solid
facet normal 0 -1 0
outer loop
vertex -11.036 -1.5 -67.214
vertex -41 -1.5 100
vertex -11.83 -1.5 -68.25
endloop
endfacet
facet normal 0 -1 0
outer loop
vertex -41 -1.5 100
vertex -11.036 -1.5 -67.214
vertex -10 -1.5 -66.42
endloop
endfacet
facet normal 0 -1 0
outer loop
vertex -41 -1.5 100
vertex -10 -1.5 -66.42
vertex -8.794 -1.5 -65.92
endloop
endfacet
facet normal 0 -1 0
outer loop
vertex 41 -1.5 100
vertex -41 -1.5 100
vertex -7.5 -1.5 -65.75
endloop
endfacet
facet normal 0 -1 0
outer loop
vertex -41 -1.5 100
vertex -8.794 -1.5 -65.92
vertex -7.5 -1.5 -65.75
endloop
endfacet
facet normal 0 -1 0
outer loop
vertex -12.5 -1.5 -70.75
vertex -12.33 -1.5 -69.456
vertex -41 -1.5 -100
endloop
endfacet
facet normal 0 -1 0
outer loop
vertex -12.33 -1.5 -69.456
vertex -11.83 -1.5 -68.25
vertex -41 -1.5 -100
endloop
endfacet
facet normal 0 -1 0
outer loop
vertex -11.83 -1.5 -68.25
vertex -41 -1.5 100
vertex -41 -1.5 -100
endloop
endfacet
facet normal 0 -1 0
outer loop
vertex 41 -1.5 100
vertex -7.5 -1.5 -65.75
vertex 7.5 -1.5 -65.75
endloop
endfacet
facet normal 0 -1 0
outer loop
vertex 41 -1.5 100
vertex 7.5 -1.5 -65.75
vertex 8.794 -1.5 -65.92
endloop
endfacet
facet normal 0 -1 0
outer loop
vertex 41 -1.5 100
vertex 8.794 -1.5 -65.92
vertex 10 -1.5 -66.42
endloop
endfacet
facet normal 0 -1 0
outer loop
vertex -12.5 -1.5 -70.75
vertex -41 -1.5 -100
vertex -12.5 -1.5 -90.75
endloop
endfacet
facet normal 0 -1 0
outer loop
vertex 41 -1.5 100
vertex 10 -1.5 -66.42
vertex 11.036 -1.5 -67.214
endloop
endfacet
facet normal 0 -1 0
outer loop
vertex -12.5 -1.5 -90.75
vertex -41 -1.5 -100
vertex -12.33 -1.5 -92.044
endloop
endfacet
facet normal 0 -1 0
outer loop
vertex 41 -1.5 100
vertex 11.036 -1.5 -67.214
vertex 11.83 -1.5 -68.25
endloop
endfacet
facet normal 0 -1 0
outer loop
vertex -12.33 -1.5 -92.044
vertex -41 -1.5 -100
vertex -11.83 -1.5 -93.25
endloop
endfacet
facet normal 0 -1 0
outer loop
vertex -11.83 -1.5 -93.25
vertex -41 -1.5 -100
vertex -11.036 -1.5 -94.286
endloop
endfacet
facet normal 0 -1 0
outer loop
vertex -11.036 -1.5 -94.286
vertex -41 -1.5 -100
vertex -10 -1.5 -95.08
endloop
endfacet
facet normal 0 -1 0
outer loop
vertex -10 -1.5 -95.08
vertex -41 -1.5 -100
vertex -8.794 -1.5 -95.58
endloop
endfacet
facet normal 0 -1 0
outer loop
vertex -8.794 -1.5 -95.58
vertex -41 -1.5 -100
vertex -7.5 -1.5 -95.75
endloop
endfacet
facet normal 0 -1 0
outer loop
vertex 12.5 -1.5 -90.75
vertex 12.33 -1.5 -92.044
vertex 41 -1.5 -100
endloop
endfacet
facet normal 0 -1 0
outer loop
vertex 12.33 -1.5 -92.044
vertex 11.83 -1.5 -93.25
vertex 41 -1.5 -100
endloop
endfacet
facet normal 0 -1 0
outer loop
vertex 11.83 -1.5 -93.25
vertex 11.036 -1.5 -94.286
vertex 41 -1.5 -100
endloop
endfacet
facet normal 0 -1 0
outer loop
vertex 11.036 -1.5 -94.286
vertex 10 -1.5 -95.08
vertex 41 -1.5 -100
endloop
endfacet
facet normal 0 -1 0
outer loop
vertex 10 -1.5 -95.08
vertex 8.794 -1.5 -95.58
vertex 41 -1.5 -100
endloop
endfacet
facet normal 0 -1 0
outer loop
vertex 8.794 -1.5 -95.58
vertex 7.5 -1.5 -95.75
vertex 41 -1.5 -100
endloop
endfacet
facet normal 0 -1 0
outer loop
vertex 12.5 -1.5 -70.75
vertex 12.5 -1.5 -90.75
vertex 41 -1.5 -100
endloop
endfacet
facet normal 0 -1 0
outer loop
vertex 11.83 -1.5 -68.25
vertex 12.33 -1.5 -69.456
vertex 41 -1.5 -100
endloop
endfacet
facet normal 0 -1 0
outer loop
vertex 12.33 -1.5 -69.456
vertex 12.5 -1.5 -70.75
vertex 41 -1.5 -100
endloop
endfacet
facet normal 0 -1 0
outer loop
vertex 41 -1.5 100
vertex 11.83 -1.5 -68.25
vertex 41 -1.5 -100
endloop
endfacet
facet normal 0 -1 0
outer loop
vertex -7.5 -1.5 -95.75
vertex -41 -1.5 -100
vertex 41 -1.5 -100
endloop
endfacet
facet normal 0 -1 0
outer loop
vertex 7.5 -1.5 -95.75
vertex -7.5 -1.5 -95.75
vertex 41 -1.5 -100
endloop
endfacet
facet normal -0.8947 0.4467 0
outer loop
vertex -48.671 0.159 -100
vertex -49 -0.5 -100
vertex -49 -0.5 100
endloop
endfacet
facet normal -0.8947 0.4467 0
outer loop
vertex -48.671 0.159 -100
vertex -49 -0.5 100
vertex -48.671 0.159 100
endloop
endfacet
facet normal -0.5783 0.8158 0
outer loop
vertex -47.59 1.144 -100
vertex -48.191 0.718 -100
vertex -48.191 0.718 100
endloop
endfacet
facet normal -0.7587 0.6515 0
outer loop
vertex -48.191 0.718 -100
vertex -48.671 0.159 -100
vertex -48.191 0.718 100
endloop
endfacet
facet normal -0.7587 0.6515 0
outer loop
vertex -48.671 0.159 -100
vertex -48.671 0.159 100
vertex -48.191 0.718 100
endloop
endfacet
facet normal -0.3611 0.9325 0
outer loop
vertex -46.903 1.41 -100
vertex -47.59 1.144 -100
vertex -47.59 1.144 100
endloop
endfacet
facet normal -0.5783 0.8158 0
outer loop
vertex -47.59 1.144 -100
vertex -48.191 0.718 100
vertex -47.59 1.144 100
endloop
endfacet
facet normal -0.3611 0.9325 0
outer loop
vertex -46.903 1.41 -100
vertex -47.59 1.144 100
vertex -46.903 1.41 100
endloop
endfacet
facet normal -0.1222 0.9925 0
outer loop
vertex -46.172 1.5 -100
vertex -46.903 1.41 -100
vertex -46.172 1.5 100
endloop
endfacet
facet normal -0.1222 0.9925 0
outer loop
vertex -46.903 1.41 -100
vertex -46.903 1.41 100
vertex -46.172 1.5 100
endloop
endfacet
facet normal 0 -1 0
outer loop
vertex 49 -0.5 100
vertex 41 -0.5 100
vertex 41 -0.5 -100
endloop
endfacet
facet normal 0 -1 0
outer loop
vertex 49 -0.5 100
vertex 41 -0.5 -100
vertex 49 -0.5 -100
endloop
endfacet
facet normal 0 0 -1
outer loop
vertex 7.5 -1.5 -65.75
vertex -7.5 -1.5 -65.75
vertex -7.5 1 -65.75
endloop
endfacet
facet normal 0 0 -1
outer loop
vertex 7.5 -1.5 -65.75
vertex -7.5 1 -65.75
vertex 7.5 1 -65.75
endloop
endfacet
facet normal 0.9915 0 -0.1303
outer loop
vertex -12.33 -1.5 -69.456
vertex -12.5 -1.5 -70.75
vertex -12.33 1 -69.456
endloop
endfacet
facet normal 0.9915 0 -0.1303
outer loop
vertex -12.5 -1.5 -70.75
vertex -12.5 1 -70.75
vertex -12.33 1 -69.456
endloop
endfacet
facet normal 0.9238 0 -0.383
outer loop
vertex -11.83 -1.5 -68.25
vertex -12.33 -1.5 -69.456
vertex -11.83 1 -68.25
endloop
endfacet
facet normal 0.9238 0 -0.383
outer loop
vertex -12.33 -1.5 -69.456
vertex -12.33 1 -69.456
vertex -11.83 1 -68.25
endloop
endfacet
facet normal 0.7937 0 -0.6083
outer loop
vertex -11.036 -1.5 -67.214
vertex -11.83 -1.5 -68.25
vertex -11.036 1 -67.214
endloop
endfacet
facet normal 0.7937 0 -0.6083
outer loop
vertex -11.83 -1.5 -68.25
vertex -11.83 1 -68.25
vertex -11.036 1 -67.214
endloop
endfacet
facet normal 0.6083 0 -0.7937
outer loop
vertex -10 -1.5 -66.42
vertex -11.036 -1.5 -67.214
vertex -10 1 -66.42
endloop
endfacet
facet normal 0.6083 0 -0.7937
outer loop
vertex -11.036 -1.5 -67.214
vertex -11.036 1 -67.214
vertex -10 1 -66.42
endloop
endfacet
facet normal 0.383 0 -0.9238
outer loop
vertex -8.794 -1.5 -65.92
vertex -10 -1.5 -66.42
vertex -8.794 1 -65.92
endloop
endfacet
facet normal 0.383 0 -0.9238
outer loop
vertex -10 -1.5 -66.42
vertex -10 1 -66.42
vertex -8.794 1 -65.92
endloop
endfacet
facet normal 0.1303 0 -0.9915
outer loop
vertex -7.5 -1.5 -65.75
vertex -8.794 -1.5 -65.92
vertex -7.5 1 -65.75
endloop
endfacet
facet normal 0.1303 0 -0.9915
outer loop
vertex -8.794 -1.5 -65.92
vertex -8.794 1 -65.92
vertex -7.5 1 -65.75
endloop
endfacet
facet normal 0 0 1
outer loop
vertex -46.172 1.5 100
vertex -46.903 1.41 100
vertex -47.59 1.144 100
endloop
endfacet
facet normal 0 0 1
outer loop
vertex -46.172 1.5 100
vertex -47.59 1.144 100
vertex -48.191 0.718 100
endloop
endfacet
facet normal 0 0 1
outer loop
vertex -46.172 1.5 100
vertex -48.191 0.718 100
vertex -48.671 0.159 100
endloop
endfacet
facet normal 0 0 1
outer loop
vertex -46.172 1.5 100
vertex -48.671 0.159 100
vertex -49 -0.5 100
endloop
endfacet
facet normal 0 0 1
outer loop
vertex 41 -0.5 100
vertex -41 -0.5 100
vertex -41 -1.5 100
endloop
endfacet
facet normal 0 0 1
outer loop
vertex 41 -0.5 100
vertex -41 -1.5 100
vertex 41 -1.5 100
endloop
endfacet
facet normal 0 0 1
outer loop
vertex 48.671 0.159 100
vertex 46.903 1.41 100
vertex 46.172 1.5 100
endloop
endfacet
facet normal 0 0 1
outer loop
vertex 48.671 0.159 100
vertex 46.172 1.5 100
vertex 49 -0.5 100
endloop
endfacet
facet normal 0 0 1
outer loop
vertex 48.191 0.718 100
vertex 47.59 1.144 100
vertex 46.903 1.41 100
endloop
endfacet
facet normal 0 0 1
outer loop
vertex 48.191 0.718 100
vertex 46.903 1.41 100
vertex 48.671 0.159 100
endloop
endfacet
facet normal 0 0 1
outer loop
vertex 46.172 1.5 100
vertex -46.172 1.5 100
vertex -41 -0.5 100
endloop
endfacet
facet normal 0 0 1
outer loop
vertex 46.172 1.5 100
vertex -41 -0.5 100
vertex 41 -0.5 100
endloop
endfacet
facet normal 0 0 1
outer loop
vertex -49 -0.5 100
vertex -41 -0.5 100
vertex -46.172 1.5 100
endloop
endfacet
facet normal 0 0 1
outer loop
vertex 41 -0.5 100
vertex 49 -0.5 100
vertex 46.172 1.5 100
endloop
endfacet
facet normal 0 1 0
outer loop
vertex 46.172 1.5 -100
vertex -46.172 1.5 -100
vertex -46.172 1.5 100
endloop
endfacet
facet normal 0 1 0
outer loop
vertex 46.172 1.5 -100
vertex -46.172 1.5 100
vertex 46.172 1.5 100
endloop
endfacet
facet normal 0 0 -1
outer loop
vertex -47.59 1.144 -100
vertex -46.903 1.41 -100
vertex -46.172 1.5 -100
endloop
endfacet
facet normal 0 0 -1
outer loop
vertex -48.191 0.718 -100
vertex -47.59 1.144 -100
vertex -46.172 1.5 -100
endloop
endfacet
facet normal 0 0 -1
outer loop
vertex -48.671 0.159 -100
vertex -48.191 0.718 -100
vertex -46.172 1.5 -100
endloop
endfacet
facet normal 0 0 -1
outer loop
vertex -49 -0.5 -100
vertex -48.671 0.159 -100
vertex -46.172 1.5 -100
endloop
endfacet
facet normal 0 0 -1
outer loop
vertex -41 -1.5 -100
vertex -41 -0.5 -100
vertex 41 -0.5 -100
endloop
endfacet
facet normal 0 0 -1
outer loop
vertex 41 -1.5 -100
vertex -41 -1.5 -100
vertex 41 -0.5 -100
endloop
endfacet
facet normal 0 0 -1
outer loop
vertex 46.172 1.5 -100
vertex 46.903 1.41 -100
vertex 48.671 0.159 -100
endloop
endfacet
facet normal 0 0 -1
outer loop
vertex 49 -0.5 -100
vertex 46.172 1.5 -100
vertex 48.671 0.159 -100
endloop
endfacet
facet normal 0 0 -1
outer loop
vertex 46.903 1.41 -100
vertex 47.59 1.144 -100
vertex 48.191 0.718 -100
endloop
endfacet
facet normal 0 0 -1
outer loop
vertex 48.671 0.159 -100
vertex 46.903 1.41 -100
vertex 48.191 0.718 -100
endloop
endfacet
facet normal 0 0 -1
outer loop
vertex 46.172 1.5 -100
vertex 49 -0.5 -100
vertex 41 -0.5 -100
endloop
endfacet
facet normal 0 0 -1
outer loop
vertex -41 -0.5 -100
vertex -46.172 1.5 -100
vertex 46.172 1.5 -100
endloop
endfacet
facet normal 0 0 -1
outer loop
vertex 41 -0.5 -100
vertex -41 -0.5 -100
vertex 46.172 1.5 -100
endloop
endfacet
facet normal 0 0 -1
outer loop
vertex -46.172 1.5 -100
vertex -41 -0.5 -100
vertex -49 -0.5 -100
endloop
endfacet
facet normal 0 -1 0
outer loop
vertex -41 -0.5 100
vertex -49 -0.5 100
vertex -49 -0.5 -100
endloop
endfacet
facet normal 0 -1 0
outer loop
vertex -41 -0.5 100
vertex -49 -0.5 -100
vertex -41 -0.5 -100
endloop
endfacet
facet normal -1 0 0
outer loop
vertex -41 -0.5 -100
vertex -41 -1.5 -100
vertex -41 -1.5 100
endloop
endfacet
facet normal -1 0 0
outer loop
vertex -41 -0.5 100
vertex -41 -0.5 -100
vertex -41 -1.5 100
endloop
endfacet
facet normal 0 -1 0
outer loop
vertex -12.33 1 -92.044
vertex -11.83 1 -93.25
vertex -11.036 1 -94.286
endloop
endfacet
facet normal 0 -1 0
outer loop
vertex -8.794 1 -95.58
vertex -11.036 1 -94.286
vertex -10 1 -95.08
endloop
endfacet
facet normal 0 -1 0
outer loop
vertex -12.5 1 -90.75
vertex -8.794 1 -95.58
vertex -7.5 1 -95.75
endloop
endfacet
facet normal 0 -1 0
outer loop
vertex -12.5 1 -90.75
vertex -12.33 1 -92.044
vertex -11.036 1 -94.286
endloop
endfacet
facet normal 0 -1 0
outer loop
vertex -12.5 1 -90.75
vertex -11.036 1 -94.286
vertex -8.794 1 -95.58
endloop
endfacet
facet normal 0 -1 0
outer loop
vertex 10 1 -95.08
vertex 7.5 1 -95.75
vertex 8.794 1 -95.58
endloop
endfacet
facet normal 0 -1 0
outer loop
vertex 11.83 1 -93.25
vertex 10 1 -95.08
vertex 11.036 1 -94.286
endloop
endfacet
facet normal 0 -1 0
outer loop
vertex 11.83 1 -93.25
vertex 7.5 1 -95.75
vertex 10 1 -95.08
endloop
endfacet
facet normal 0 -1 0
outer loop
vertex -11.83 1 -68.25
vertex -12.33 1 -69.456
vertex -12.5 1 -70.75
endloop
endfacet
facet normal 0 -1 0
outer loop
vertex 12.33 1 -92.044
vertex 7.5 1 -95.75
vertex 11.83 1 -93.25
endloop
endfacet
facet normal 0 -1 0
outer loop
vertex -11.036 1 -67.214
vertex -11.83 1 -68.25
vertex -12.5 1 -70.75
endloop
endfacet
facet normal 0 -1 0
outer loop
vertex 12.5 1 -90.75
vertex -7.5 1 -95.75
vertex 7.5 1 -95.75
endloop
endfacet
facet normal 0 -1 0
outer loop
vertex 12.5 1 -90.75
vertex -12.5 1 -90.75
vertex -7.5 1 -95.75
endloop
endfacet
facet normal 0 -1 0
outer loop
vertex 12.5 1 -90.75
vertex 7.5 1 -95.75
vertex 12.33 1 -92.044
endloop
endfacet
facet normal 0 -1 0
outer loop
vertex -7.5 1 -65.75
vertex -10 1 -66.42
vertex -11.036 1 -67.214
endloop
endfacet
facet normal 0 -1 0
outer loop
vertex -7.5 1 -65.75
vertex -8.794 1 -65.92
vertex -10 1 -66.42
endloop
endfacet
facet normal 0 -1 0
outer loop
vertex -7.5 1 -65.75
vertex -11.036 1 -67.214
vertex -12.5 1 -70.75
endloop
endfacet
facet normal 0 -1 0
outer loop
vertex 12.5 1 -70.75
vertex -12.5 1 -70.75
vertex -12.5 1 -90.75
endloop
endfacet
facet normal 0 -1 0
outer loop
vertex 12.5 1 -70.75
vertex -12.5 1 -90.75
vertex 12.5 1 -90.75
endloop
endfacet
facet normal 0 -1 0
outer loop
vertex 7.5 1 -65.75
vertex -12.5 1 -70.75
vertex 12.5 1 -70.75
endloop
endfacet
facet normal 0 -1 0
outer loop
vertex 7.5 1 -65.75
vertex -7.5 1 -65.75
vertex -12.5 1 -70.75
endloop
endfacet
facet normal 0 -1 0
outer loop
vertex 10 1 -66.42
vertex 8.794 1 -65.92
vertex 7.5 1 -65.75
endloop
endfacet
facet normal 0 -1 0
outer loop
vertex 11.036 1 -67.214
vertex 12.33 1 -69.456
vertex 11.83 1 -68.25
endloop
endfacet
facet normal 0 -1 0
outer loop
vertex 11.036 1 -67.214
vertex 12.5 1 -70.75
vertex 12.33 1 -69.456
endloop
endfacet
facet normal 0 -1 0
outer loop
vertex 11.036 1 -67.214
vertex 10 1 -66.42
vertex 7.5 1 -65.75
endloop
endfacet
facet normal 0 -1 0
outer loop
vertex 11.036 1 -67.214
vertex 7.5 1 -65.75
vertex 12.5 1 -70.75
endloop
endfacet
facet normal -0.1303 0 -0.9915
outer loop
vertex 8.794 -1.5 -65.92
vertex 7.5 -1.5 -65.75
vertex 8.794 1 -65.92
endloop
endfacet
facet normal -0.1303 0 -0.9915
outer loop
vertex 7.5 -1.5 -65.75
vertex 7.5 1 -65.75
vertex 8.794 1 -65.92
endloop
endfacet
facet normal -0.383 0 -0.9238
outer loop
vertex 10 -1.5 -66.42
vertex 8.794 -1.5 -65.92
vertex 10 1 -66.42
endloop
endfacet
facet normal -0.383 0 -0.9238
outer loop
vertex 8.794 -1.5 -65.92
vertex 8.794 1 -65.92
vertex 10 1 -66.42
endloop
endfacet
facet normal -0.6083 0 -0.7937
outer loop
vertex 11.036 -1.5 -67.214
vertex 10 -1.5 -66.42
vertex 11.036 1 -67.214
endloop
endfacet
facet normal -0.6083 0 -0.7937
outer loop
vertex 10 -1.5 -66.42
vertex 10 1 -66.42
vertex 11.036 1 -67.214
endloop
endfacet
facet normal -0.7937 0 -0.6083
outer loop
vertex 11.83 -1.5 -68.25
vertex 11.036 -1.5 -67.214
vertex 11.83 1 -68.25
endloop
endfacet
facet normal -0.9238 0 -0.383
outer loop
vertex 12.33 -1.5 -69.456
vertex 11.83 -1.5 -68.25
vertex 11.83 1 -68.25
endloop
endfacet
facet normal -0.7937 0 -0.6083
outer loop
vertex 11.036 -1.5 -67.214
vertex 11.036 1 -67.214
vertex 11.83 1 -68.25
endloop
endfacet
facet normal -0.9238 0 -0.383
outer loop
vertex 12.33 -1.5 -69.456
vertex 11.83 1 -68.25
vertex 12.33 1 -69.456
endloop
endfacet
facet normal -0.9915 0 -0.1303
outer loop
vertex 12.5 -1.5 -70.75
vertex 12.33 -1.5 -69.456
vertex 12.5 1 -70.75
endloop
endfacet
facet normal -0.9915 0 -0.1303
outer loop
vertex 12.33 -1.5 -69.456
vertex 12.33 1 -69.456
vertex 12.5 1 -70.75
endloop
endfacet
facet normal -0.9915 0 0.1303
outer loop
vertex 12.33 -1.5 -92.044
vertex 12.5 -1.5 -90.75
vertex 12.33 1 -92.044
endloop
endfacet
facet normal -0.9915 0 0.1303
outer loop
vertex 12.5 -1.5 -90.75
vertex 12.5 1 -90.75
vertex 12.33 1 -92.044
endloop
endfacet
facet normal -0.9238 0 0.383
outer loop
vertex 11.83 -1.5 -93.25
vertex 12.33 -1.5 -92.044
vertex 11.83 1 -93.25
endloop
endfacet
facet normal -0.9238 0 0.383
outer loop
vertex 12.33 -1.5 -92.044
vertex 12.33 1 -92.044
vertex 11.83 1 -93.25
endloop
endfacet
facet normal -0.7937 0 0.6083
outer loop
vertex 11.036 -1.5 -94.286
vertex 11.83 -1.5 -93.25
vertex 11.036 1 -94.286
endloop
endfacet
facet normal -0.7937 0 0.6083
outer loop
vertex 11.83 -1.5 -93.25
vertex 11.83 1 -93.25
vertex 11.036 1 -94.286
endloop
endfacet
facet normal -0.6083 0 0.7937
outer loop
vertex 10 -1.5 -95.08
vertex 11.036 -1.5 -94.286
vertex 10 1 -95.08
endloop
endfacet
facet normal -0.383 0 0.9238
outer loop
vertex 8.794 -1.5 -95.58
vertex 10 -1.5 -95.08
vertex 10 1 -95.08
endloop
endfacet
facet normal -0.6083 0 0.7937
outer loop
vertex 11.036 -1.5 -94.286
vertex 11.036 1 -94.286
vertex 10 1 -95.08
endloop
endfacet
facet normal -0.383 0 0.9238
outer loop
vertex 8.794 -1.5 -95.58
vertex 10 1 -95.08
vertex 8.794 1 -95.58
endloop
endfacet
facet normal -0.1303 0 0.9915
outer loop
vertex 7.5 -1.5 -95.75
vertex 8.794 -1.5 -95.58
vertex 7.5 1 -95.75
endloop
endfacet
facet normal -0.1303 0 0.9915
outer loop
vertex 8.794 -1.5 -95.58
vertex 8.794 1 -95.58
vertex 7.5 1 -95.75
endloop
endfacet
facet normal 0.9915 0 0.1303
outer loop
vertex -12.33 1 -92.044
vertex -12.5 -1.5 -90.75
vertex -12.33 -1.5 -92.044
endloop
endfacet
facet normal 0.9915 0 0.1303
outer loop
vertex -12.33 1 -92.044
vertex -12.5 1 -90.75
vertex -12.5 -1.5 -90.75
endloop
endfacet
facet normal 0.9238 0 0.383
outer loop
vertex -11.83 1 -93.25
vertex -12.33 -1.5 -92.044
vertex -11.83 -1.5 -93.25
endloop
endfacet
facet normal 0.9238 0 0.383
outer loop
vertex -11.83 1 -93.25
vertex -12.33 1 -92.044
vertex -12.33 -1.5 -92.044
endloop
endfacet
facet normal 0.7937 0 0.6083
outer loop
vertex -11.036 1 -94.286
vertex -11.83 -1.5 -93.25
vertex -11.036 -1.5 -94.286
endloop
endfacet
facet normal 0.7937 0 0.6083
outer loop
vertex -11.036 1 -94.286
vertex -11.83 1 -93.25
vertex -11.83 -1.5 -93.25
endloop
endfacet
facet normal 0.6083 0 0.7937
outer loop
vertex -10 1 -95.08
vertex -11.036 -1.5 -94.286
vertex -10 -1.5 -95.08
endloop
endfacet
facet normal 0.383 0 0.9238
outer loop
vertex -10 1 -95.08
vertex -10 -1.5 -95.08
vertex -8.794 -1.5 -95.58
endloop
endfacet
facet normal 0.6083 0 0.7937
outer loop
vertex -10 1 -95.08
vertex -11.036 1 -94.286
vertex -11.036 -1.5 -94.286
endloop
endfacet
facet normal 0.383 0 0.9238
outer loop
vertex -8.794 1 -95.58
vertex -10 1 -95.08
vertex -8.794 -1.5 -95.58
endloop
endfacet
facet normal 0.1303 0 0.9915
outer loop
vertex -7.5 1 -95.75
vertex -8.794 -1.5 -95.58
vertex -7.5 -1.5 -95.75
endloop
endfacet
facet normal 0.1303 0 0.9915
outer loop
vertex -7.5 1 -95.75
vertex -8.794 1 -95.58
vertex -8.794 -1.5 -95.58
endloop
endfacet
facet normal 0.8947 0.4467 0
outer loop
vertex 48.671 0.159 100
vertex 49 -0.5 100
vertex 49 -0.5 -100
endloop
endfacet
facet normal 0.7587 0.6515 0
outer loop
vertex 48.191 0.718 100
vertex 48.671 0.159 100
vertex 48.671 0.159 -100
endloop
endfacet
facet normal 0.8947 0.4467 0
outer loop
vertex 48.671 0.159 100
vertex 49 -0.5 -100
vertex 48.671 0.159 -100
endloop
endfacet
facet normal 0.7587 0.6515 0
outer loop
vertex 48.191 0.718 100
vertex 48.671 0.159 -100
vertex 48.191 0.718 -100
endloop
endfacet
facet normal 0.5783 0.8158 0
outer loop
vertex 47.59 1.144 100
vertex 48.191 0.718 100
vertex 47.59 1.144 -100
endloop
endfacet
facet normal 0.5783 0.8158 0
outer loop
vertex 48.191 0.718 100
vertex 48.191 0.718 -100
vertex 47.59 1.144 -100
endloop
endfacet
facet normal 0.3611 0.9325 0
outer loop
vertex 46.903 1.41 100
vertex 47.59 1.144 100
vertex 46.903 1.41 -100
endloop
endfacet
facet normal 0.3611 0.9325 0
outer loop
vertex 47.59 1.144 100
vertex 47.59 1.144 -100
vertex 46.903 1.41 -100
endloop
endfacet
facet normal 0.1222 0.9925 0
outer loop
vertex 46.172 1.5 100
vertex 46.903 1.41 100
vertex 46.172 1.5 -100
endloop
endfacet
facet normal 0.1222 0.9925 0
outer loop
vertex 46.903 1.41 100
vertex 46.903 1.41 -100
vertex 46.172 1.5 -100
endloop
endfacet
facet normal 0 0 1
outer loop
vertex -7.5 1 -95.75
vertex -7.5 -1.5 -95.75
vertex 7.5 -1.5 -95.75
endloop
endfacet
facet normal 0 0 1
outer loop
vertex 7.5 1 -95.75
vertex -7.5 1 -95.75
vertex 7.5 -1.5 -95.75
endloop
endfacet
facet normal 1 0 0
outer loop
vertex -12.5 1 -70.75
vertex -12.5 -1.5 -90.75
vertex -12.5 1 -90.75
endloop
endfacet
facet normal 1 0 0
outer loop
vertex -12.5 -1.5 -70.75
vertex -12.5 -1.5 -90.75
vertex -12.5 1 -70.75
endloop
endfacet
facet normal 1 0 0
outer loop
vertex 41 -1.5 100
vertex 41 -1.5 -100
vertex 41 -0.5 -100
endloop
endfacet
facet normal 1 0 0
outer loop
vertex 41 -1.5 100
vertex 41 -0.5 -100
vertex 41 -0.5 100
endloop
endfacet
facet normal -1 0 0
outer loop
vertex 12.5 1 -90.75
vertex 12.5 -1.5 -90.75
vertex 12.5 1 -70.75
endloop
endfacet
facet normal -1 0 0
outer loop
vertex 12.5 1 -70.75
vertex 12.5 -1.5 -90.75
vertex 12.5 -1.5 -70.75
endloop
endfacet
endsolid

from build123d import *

# Parameters (mm, degrees)
SKIZZE2_W                       = 98
SKIZZE2_H                       = 200
AUFSATZ_LINEAR_AUSTRAGEN2_DEPTH = 1.5
SKIZZE4_W                       = 8
SKIZZE4_H                       = 200
SCHNITT_LINEAR_AUSTRAGEN1_DEPTH = 1
VERRUNDUNG1_R                   = 3
SKIZZE5_W                       = 25
SKIZZE5_H                       = 30
SCHNITT_LINEAR_AUSTRAGEN2_DEPTH = 2.5
VERRUNDUNG2_R                   = 5


with BuildPart() as part:
    # Skizze2 → Aufsatz-Linear austragen2 (new, symmetric)
    with BuildSketch(Plane(origin=(0, 0, 0), x_dir=(1, 0, 0), z_dir=(0, 1, 0))):
        Rectangle(SKIZZE2_W, SKIZZE2_H)
    extrude(amount=AUFSATZ_LINEAR_AUSTRAGEN2_DEPTH, both=True)

    # Skizze4 → Schnitt-Linear austragen1 (cut)
    with BuildSketch(Plane.XZ.offset(1.5)):
        with Locations((-45, 0)):
            Rectangle(SKIZZE4_W, SKIZZE4_H)
        with Locations((45, 0)):
            Rectangle(SKIZZE4_W, SKIZZE4_H)
    extrude(amount=-SCHNITT_LINEAR_AUSTRAGEN1_DEPTH, mode=Mode.SUBTRACT)

    # Verrundung1
    # the kernel refuses this fillet: 3 mm, written as the material it takes off along each edge
    with BuildSketch(Plane(origin=(-49, 1.5, 107.071067812), x_dir=(0, -1, 0), z_dir=(0, 0, -1))) as verrundung1_piece_1:
        with BuildLine():
            CenterArc((3, -2.828427125), VERRUNDUNG1_R, 109.471220634, 70.528779366)
            Line((0, -2.828427125), (-0.06, -2.828427125))
            Line((-0.06, -2.828427125), (-0.06, 0))
            Line((-0.06, 0), (0, 0.06))
            ThreePointArc((0, 0.06), (1, 0.06), (1.98, 0.056568542))
            Line((1.98, 0.056568542), (2, 0))
        make_face()
    extrude(amount=214.142135624, mode=Mode.SUBTRACT)
    with BuildSketch(Plane(origin=(49, 1.5, -107.071067812), x_dir=(-1, 0, 0), z_dir=(0, 0, 1))) as verrundung1_piece_2:
        with BuildLine():
            CenterArc((2.828427125, 3), VERRUNDUNG1_R, 199.471220634, 70.528779366)
            Line((0, 2), (-0.056568542, 1.98))
            ThreePointArc((-0.056568542, 1.98), (-0.06, 1), (-0.06, 0))
            Line((-0.06, 0), (0, -0.06))
            Line((0, -0.06), (2.828427125, -0.06))
            Line((2.828427125, -0.06), (2.828427125, 0))
        make_face()
    extrude(amount=214.142135624, mode=Mode.SUBTRACT)

    # Skizze5 → Schnitt-Linear austragen2 (cut)
    with BuildSketch(Plane.XZ.offset(1.5)):
        with Locations((0, -80.75)):
            Rectangle(SKIZZE5_W, SKIZZE5_H)
    extrude(amount=-SCHNITT_LINEAR_AUSTRAGEN2_DEPTH, mode=Mode.SUBTRACT)

    # Verrundung2
    verrundung2_edges = [part.edges().sort_by_distance(p)[0] for p in [
        (-12.5, -0.25, -95.75),
        (-12.5, -0.25, -65.75),
        (12.5, -0.25, -65.75),
        (12.5, -0.25, -95.75),
    ]]
    fillet(verrundung2_edges, radius=VERRUNDUNG2_R)


solid = part.part
